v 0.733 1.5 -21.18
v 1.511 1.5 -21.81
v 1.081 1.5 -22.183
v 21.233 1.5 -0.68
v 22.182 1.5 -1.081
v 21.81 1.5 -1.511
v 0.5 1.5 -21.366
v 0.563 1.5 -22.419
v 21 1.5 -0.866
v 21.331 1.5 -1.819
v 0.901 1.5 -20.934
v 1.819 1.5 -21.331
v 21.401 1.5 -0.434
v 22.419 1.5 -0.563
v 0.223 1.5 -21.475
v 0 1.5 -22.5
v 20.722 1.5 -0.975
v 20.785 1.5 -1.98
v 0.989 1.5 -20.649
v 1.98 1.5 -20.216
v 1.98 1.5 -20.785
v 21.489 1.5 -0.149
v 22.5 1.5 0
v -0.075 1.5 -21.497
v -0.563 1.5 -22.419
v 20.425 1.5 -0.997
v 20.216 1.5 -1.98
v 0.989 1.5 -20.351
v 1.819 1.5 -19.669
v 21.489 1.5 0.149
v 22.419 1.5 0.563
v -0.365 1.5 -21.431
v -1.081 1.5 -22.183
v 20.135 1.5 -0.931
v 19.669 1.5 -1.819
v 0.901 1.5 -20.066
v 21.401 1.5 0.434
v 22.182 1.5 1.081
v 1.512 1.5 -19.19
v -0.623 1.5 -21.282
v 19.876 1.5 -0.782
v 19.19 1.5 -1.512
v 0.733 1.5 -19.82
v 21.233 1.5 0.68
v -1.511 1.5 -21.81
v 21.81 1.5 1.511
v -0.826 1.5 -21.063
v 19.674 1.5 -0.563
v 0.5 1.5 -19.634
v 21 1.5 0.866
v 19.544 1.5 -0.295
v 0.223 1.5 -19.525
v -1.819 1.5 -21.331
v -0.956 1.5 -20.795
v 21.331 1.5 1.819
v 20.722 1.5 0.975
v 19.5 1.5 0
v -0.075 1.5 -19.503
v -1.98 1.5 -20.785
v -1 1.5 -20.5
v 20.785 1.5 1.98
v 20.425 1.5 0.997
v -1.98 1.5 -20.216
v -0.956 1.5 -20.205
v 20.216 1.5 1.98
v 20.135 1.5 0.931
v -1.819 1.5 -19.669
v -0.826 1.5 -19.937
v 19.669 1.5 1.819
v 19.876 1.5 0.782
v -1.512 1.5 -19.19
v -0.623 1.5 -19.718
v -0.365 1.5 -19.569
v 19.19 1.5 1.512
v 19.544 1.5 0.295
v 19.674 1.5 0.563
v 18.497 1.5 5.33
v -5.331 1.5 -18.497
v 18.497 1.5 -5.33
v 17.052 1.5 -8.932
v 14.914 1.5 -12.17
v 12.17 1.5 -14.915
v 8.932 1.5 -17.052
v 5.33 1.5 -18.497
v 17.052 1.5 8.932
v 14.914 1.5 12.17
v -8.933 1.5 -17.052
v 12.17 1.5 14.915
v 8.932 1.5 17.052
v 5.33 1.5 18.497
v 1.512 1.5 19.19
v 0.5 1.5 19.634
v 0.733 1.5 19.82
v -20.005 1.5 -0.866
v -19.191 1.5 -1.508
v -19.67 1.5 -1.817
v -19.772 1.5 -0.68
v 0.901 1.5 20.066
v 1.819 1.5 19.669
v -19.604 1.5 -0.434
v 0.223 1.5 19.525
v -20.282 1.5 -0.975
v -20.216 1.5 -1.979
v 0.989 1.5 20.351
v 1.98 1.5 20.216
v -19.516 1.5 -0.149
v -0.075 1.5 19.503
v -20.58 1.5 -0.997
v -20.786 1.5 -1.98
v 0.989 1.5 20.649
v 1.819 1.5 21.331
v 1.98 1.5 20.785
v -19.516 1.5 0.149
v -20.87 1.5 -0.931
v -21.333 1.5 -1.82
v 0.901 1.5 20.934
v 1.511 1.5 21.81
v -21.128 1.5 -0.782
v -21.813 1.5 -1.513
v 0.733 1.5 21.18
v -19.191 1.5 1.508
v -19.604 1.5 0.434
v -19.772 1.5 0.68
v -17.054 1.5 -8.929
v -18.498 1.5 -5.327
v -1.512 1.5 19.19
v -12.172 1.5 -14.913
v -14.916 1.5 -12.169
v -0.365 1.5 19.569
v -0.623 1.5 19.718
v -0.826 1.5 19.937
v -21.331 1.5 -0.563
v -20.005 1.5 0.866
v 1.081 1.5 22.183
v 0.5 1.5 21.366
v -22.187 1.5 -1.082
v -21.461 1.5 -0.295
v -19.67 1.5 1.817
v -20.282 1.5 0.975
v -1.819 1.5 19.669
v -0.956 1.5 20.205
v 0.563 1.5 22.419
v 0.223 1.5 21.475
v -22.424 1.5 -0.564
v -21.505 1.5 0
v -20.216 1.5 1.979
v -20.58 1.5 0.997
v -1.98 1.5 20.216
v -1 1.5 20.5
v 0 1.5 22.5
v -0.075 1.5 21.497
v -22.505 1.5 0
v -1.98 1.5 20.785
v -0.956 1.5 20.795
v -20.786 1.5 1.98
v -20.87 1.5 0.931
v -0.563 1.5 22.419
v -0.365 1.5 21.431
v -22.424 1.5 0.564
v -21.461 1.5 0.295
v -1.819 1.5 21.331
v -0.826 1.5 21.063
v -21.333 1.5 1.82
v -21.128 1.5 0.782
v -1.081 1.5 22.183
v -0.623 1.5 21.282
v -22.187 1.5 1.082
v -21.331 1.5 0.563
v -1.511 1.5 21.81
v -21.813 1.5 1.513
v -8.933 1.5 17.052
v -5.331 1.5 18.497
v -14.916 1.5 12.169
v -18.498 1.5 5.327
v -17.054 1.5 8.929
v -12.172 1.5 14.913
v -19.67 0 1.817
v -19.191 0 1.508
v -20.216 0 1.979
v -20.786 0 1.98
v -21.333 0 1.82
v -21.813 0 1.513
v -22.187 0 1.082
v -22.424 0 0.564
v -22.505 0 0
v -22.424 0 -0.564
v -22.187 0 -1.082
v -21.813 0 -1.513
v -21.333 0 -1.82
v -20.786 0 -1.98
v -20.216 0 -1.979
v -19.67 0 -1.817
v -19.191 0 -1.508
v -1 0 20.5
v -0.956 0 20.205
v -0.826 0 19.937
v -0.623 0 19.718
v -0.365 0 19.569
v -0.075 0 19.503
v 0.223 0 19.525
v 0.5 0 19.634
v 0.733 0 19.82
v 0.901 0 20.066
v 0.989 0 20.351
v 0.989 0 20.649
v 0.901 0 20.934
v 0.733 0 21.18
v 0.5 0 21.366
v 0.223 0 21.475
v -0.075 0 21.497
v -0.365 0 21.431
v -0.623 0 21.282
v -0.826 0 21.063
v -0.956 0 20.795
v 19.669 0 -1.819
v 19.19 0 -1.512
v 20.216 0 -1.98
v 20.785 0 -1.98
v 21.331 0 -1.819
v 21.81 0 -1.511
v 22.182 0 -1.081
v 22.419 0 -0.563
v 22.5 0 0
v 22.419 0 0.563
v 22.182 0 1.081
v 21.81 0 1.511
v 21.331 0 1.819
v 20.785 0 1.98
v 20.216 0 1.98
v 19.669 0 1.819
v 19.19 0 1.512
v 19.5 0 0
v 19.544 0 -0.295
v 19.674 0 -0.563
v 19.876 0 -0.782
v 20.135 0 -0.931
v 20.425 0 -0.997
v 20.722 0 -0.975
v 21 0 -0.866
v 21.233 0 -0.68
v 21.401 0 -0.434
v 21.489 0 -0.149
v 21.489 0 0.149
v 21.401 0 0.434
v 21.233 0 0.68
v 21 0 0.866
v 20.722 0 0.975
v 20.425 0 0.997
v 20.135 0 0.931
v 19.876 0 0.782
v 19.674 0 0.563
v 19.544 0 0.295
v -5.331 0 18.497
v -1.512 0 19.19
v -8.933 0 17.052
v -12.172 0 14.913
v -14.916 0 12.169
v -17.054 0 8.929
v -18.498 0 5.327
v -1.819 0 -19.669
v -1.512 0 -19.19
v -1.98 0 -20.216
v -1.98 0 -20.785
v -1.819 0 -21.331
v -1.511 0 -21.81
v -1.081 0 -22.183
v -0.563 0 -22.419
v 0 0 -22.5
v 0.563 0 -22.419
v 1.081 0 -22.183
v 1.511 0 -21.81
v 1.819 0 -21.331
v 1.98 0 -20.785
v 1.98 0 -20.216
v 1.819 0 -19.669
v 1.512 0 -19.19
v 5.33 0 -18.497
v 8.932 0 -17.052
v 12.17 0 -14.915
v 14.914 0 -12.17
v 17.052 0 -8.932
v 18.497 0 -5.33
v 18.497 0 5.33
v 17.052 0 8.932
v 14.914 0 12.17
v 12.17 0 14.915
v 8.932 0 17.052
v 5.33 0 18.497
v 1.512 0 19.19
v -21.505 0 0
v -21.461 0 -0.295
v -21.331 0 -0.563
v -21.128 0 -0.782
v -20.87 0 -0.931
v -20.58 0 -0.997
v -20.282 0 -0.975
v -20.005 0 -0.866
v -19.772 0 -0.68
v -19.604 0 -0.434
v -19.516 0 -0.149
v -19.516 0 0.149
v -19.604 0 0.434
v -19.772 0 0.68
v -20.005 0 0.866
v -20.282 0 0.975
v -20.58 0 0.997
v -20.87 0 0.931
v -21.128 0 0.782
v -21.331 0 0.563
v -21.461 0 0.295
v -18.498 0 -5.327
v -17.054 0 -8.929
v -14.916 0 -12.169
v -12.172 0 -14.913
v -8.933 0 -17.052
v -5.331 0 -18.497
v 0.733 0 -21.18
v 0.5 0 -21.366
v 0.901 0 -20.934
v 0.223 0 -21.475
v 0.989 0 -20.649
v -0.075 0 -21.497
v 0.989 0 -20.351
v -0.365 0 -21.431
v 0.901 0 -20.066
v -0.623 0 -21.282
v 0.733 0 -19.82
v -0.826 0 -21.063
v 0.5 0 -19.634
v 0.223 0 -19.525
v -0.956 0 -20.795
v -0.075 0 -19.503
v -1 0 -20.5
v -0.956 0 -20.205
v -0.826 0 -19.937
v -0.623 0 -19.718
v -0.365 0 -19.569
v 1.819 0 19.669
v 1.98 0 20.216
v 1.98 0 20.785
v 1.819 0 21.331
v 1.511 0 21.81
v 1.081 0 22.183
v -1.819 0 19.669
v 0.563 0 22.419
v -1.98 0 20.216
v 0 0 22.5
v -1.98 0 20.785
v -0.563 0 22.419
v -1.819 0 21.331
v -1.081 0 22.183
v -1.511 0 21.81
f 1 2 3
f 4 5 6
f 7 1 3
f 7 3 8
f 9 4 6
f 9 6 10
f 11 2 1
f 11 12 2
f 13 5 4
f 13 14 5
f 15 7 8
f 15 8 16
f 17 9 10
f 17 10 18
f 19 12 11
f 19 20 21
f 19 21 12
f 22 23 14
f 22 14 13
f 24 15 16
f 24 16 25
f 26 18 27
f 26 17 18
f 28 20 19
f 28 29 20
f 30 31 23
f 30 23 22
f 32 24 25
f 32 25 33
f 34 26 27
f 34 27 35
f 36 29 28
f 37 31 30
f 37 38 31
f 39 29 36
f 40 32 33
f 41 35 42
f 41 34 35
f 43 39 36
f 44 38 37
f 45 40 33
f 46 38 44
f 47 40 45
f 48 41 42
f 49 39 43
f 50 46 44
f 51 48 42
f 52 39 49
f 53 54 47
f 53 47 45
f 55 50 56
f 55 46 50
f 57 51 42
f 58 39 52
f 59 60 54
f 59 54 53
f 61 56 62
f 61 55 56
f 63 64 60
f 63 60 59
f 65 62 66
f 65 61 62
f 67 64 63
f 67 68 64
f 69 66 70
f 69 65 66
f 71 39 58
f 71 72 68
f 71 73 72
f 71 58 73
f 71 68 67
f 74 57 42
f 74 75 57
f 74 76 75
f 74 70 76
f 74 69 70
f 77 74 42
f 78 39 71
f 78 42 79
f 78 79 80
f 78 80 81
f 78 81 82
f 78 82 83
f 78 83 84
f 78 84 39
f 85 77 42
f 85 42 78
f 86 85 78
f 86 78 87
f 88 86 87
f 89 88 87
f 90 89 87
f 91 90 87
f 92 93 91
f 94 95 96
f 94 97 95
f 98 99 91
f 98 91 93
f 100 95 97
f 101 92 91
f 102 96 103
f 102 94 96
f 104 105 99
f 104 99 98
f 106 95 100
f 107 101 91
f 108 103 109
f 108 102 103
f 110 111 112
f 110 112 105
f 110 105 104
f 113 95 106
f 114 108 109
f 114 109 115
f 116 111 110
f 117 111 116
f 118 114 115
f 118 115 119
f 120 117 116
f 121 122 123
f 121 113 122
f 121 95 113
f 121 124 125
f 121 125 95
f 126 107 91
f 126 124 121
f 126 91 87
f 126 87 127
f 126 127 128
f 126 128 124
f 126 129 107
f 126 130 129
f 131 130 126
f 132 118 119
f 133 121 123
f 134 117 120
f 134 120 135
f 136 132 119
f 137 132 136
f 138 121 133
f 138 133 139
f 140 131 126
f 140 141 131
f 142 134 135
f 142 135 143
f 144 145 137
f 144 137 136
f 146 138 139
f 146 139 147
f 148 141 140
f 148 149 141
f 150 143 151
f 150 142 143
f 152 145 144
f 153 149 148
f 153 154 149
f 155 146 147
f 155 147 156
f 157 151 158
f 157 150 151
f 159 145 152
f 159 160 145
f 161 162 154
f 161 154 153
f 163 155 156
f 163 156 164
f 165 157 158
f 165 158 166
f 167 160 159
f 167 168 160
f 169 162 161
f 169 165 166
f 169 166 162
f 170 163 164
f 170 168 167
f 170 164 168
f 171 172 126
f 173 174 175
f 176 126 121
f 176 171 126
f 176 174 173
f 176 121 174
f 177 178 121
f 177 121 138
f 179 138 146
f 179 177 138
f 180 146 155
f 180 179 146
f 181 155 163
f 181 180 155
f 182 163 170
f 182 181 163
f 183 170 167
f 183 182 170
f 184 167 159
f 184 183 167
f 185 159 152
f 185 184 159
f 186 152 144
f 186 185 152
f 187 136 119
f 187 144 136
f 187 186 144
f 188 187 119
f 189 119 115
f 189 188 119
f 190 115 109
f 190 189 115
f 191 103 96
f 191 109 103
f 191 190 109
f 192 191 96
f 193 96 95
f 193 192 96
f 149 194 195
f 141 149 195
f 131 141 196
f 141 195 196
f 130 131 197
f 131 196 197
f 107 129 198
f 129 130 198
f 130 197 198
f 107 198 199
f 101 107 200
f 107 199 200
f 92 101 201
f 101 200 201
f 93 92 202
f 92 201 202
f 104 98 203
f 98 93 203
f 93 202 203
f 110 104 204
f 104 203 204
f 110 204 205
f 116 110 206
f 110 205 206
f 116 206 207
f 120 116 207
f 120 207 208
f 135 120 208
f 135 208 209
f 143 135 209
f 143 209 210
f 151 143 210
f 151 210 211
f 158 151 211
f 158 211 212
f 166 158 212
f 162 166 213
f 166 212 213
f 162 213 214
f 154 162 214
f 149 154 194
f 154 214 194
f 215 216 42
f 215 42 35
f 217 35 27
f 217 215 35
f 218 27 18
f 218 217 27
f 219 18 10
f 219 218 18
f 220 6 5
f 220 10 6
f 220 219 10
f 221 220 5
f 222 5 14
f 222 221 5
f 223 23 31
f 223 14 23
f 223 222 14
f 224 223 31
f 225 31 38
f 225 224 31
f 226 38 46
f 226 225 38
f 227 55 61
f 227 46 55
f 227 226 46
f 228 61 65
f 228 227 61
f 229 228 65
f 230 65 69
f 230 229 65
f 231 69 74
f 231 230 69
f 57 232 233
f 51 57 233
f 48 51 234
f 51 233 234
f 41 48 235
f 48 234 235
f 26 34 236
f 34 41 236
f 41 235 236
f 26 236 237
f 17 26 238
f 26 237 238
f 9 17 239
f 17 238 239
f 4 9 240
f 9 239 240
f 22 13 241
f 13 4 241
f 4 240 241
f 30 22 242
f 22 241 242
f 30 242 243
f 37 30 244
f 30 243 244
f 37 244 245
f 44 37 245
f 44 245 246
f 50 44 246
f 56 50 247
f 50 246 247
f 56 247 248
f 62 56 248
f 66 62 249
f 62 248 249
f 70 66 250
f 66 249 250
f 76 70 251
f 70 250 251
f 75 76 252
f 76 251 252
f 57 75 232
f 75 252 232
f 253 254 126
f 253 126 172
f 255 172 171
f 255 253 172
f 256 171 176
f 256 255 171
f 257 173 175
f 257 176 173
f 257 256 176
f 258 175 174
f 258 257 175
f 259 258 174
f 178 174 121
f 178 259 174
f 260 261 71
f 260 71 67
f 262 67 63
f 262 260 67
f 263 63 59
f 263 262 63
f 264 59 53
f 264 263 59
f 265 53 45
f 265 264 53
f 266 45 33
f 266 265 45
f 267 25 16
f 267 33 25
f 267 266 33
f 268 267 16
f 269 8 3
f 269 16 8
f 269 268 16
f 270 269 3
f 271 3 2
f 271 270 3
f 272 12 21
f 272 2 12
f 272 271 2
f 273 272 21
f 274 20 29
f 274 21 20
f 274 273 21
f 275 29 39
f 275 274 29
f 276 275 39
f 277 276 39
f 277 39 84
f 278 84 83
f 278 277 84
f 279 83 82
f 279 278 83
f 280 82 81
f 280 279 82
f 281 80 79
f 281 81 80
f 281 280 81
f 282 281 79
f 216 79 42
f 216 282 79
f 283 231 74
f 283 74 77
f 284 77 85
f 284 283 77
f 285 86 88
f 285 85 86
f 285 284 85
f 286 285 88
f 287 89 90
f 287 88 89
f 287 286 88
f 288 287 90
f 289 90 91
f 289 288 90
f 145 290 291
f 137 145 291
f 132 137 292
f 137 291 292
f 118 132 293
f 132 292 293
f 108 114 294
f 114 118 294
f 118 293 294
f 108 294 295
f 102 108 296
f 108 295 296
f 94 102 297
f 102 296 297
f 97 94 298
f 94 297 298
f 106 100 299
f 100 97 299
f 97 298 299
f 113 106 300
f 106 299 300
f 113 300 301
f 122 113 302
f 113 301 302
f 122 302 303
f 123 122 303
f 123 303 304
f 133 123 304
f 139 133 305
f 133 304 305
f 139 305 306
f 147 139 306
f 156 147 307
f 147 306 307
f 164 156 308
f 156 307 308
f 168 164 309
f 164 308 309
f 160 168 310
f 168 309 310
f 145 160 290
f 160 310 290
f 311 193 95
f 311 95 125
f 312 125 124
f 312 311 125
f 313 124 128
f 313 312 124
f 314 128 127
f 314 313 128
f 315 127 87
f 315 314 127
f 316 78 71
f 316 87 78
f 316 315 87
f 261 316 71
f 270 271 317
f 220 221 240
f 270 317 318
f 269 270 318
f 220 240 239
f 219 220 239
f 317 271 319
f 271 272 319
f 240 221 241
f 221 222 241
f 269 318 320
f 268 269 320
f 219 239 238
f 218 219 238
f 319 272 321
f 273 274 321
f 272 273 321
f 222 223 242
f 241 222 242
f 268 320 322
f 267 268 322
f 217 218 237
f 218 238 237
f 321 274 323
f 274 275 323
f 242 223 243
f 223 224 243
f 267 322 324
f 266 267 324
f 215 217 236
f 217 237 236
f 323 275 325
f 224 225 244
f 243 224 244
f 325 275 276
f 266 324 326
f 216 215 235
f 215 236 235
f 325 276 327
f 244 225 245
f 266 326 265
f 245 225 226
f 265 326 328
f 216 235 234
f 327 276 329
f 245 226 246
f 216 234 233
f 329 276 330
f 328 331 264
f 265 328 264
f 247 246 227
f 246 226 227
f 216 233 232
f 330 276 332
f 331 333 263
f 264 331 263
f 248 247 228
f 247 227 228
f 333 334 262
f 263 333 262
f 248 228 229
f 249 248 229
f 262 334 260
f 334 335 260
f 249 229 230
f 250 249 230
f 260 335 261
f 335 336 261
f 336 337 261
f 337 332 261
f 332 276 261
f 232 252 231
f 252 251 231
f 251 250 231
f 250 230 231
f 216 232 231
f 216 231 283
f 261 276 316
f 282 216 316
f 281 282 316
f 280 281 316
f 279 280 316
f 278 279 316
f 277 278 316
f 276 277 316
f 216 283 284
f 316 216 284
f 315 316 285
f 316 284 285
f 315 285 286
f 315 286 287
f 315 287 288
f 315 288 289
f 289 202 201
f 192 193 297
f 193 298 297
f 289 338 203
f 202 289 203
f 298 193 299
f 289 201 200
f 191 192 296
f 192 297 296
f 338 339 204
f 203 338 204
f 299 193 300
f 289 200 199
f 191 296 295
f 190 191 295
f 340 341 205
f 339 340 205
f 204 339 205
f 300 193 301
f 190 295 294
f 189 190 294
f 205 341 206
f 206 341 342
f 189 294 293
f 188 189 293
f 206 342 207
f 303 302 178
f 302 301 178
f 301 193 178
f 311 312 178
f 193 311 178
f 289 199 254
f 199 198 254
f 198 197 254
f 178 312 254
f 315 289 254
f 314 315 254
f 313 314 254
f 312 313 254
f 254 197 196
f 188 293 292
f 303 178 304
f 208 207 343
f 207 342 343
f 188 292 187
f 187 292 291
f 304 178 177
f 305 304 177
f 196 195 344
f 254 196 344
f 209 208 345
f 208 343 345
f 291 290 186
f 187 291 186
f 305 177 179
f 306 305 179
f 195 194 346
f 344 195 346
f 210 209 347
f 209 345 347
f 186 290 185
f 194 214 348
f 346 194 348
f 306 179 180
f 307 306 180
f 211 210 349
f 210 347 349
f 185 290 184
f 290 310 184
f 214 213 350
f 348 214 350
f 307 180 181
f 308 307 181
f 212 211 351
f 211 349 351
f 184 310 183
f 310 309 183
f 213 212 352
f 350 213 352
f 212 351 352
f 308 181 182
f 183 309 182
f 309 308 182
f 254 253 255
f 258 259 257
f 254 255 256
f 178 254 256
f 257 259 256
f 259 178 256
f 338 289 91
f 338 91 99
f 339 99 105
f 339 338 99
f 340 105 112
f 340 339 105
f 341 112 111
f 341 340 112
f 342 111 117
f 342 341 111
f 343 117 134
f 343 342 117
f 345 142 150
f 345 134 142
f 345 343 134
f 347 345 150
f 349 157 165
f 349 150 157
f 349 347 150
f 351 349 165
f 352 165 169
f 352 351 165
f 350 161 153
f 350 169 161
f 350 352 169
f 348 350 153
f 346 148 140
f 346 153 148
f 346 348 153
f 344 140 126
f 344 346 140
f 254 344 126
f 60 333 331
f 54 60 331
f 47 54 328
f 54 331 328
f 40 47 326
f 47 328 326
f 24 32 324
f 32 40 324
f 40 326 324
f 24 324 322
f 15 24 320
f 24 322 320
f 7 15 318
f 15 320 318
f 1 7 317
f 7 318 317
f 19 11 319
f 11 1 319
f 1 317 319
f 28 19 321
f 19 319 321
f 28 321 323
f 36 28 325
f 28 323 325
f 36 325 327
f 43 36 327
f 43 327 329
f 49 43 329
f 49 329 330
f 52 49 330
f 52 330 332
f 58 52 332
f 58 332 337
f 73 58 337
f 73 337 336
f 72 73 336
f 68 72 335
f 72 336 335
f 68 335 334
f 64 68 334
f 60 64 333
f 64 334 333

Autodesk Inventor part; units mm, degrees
ref_plane "YZ Plane" through (0, 0, 0) normal (1, 0, 0) x (0, 1, 0)
ref_plane "XZ Plane" through (0, 0, 0) normal (0, 1, 0) x (-1, 0, 0)
ref_plane "XY Plane" through (0, 0, 0) normal (0, 0, 1) x (1, 0, 0)
sketch "Sketch1" plane through (0, 0, 0) normal (0, 1, 0) x (-1, 0, 0)
  arc A0 (-1.5117, -19.1905) -> (1.5117, -19.1905) centre (0, -20.5) ccw
  circle A1 centre (0, 20.5) radius 1
  circle A2 centre (0, -20.5) radius 1
  arc A3 (-1.5117, 19.1905) -> (-19.1905, 1.5118) centre (0, 0) ccw
  arc A4 (-19.1905, 1.5118) -> (-19.1905, -1.5118) centre (-20.4999, 0) ccw
  arc A5 (-19.1905, -1.5118) -> (-1.5117, -19.1905) centre (0, 0) ccw
  arc A6 (-1.5117, -19.1905) -> (1.5117, -19.1905) centre (0, -20.5) ccw
  arc A7 (1.5117, -19.1905) -> (19.1909, -1.5076) centre (0, 0) ccw
  arc A8 (19.1909, -1.5076) -> (19.1909, 1.5076) centre (20.505, 0) ccw
  arc A9 (19.1909, 1.5076) -> (1.5117, 19.1905) centre (0, 0) ccw
  arc A10 (1.5117, 19.1905) -> (-1.5117, 19.1905) centre (0, 20.5) ccw
  circle A11 centre (-20.4999, 0) radius 1
  arc A12 (-18.5, -0.0197) -> (-18.5, 0.0197) centre (-20.4999, 0) ccw
  circle A13 centre (20.505, 0) radius 1
extrude "Extrusion1" add sketch "Sketch1" along normal blind 1.5
properties part number "tapaRGB-anillo"
